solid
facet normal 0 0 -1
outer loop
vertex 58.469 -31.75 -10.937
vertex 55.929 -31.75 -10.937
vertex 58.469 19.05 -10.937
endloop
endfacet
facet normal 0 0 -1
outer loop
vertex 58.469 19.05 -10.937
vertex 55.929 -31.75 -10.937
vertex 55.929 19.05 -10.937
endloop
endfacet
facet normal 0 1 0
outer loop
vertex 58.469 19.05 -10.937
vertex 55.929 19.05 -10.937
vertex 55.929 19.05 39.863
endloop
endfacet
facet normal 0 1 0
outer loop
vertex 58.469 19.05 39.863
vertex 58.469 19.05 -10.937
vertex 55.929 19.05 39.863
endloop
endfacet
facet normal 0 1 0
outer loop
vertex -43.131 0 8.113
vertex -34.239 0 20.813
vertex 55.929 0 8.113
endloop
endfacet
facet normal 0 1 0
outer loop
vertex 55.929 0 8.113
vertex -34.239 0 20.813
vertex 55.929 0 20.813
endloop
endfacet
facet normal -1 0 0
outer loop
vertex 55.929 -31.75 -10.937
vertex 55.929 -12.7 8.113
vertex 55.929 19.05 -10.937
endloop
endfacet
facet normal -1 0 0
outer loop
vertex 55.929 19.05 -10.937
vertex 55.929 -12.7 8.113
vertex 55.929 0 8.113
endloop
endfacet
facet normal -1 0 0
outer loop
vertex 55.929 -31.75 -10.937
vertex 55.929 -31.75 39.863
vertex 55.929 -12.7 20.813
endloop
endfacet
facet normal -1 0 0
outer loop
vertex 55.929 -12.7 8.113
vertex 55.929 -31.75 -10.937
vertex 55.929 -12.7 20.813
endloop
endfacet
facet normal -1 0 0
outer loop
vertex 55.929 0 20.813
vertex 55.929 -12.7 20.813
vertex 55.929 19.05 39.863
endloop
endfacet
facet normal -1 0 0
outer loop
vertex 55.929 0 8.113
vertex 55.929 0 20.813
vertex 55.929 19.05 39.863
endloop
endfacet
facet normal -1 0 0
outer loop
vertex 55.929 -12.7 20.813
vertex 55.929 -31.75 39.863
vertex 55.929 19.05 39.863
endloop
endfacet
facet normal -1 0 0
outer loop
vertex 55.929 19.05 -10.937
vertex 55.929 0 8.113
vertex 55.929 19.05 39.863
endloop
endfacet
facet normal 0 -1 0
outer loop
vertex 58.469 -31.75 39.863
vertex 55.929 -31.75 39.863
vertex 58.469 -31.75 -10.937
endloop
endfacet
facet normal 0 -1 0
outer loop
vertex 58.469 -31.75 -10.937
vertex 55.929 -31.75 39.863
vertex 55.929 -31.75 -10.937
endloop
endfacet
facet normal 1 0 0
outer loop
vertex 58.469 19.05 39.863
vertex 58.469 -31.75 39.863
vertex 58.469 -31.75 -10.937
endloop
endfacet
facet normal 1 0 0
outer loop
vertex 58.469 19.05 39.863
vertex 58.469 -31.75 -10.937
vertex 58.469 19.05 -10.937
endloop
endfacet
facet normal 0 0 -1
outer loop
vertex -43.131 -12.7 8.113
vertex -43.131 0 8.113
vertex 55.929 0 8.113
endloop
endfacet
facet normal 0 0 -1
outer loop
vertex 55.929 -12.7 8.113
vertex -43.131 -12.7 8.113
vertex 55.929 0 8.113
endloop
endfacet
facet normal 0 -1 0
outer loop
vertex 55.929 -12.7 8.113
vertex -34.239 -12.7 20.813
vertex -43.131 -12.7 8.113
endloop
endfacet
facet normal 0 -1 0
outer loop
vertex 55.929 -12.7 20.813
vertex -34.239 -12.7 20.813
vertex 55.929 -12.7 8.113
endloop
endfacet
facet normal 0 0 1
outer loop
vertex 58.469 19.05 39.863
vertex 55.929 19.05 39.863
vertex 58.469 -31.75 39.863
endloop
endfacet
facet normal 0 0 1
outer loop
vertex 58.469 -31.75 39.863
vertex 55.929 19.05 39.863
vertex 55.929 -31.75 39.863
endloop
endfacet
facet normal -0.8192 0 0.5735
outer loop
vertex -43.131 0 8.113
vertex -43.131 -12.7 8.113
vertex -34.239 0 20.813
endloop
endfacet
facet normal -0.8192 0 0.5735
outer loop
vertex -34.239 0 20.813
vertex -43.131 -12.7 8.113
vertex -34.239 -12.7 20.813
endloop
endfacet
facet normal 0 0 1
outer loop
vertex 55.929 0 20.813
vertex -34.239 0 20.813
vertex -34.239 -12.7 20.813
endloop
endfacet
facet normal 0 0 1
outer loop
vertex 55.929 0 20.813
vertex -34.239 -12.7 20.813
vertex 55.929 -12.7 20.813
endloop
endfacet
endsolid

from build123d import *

# Parameters (mm, degrees)
F0_W     = 101.6
F0_H     = 12.7
F1_DEPTH = 12.7
F3_DEPTH = 25.4
F4_W     = 12.7
F4_H     = 12.7
F5_DEPTH = 2.54
F7_DEPTH = 2.54


with BuildPart() as f1:
    # F0 (on Front) → F1 (new body)
    with BuildSketch(Plane.XZ):
        with Locations((7.6688484669, 14.4629018217)):
            Rectangle(F0_W, F0_H)
    extrude(amount=F1_DEPTH)

    # F2 (on face) → F3 (cut)
    with BuildSketch(Plane.XZ.offset(12.7)):
        Polygon((-43.1311515331, 20.8129018217), (-43.1311515331, 8.1129018217), (-34.2385157979, 20.8129018217), align=None)
    extrude(amount=-F3_DEPTH, mode=Mode.SUBTRACT)

    # F4 (on face) → F5 (cut)
    with BuildSketch(Plane.YZ.offset(58.4688484669)):
        with Locations((-6.35, 14.4629018217)):
            Rectangle(F4_W, F4_H)
    extrude(amount=-F5_DEPTH, mode=Mode.SUBTRACT)

    # F6 (on face) → F7 (join)
    with BuildSketch(Plane.YZ.offset(55.9288484669)):
        Polygon((-31.75, 39.8629018217), (-31.75, 20.8129018217), (-31.75, -10.9370981783), (19.05, -10.9370981783), (19.05, 39.8629018217), align=None)
    extrude(amount=F7_DEPTH)


solid = f1.part
